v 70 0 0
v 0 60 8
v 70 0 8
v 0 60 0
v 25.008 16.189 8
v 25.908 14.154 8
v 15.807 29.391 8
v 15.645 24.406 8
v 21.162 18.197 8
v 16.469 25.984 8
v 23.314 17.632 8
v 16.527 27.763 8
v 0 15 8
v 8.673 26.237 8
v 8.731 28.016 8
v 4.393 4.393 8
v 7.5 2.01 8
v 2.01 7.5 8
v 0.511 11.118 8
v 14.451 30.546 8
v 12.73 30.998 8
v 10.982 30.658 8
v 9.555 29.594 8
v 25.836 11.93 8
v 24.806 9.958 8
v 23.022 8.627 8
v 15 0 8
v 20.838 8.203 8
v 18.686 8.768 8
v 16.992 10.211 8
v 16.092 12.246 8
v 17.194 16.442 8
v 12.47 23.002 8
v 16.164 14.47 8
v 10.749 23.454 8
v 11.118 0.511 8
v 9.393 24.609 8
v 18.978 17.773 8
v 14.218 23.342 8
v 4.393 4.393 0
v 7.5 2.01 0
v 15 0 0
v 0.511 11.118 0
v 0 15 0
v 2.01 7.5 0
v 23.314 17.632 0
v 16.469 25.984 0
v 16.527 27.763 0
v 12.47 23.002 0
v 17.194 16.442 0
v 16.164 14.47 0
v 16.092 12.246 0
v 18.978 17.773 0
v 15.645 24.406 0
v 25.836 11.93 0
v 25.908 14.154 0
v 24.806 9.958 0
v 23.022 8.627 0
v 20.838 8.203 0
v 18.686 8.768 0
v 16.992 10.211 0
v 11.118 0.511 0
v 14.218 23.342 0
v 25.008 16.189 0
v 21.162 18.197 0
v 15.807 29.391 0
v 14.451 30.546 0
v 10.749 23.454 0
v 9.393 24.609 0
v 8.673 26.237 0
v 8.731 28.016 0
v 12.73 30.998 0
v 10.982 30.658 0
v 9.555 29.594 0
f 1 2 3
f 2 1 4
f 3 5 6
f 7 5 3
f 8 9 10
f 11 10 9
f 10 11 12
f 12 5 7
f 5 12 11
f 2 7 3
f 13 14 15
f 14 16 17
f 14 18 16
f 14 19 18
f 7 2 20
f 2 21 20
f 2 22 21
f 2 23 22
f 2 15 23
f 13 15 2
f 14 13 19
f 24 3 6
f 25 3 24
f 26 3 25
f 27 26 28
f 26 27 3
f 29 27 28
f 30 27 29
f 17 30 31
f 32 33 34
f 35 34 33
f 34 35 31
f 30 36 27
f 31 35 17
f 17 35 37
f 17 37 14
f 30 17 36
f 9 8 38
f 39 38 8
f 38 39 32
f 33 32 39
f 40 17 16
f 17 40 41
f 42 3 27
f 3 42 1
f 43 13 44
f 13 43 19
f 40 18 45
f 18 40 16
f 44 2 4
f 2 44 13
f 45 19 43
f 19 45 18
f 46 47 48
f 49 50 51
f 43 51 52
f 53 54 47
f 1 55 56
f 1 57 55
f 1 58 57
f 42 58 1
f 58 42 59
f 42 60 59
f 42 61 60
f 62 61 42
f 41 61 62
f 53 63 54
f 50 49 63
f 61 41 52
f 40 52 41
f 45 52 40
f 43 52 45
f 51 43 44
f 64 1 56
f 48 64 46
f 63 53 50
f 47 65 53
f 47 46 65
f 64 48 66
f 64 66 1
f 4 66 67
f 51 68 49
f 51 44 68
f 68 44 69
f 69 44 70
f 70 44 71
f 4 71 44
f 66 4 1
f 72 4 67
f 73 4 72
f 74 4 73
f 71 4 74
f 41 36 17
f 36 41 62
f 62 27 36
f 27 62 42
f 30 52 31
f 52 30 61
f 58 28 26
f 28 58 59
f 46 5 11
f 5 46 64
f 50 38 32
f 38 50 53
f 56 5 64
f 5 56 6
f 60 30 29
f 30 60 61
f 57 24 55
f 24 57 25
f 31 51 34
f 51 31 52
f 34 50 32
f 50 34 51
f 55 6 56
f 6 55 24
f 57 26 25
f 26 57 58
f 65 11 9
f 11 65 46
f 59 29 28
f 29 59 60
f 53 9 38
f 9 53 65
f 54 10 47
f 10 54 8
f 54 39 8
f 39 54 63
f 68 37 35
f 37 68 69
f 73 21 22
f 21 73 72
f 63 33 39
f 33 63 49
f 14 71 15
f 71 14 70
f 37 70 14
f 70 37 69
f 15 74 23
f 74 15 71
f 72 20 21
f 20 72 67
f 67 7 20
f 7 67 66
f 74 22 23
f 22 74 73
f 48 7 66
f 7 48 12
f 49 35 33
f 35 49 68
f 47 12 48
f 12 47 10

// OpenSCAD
$fn = 32;

// ----------------------------------------------------------------------
// Bracket plate: corner pad 70 x 60, fillet R15
// ----------------------------------------------------------------------

// --- parameters (mm) ---
hole_r = 4;               // bolt hole radius
plate_t = 8;              // plate thickness, Z (extrusion height)
leg_a = 70;               // base leg
leg_b = 60;               // height leg
fillet_r = 15;            // right-angle fillet radius

hole_d1 = 2 * hole_r + 2;
hole_d2 = 2 * hole_r;

profile = [[15, 0], [70, 0], [0, 60], [0, 15], [0.511, 11.118], [2.01, 7.5], [4.393, 4.393], [7.5, 2.01], [11.118, 0.511]];  // primary outline, 9 points, counter clockwise
void_1 = [[25.908, 14.154], [25.008, 16.189], [23.314, 17.632], [21.162, 18.197], [18.978, 17.773], [17.194, 16.442], [16.164, 14.47], [16.092, 12.246], [16.992, 10.211], [18.686, 8.768], [20.838, 8.203], [23.022, 8.627], [24.806, 9.958], [25.836, 11.93]];  // mount hole 1, 14 points
void_2 = [[16.527, 27.763], [15.807, 29.391], [14.451, 30.546], [12.73, 30.998], [10.982, 30.658], [9.555, 29.594], [8.731, 28.016], [8.673, 26.237], [9.393, 24.609], [10.749, 23.454], [12.47, 23.002], [14.218, 23.342], [15.645, 24.406], [16.469, 25.984]];  // mount hole 2, 14 points

// --- the one profile operation ---
difference() {
  linear_extrude(height = plate_t) polygon(points = profile);
  translate([0, 0, -1])
    linear_extrude(height = plate_t + 2) polygon(points = void_1);
  translate([0, 0, -1])
    linear_extrude(height = plate_t + 2) polygon(points = void_2);
}
